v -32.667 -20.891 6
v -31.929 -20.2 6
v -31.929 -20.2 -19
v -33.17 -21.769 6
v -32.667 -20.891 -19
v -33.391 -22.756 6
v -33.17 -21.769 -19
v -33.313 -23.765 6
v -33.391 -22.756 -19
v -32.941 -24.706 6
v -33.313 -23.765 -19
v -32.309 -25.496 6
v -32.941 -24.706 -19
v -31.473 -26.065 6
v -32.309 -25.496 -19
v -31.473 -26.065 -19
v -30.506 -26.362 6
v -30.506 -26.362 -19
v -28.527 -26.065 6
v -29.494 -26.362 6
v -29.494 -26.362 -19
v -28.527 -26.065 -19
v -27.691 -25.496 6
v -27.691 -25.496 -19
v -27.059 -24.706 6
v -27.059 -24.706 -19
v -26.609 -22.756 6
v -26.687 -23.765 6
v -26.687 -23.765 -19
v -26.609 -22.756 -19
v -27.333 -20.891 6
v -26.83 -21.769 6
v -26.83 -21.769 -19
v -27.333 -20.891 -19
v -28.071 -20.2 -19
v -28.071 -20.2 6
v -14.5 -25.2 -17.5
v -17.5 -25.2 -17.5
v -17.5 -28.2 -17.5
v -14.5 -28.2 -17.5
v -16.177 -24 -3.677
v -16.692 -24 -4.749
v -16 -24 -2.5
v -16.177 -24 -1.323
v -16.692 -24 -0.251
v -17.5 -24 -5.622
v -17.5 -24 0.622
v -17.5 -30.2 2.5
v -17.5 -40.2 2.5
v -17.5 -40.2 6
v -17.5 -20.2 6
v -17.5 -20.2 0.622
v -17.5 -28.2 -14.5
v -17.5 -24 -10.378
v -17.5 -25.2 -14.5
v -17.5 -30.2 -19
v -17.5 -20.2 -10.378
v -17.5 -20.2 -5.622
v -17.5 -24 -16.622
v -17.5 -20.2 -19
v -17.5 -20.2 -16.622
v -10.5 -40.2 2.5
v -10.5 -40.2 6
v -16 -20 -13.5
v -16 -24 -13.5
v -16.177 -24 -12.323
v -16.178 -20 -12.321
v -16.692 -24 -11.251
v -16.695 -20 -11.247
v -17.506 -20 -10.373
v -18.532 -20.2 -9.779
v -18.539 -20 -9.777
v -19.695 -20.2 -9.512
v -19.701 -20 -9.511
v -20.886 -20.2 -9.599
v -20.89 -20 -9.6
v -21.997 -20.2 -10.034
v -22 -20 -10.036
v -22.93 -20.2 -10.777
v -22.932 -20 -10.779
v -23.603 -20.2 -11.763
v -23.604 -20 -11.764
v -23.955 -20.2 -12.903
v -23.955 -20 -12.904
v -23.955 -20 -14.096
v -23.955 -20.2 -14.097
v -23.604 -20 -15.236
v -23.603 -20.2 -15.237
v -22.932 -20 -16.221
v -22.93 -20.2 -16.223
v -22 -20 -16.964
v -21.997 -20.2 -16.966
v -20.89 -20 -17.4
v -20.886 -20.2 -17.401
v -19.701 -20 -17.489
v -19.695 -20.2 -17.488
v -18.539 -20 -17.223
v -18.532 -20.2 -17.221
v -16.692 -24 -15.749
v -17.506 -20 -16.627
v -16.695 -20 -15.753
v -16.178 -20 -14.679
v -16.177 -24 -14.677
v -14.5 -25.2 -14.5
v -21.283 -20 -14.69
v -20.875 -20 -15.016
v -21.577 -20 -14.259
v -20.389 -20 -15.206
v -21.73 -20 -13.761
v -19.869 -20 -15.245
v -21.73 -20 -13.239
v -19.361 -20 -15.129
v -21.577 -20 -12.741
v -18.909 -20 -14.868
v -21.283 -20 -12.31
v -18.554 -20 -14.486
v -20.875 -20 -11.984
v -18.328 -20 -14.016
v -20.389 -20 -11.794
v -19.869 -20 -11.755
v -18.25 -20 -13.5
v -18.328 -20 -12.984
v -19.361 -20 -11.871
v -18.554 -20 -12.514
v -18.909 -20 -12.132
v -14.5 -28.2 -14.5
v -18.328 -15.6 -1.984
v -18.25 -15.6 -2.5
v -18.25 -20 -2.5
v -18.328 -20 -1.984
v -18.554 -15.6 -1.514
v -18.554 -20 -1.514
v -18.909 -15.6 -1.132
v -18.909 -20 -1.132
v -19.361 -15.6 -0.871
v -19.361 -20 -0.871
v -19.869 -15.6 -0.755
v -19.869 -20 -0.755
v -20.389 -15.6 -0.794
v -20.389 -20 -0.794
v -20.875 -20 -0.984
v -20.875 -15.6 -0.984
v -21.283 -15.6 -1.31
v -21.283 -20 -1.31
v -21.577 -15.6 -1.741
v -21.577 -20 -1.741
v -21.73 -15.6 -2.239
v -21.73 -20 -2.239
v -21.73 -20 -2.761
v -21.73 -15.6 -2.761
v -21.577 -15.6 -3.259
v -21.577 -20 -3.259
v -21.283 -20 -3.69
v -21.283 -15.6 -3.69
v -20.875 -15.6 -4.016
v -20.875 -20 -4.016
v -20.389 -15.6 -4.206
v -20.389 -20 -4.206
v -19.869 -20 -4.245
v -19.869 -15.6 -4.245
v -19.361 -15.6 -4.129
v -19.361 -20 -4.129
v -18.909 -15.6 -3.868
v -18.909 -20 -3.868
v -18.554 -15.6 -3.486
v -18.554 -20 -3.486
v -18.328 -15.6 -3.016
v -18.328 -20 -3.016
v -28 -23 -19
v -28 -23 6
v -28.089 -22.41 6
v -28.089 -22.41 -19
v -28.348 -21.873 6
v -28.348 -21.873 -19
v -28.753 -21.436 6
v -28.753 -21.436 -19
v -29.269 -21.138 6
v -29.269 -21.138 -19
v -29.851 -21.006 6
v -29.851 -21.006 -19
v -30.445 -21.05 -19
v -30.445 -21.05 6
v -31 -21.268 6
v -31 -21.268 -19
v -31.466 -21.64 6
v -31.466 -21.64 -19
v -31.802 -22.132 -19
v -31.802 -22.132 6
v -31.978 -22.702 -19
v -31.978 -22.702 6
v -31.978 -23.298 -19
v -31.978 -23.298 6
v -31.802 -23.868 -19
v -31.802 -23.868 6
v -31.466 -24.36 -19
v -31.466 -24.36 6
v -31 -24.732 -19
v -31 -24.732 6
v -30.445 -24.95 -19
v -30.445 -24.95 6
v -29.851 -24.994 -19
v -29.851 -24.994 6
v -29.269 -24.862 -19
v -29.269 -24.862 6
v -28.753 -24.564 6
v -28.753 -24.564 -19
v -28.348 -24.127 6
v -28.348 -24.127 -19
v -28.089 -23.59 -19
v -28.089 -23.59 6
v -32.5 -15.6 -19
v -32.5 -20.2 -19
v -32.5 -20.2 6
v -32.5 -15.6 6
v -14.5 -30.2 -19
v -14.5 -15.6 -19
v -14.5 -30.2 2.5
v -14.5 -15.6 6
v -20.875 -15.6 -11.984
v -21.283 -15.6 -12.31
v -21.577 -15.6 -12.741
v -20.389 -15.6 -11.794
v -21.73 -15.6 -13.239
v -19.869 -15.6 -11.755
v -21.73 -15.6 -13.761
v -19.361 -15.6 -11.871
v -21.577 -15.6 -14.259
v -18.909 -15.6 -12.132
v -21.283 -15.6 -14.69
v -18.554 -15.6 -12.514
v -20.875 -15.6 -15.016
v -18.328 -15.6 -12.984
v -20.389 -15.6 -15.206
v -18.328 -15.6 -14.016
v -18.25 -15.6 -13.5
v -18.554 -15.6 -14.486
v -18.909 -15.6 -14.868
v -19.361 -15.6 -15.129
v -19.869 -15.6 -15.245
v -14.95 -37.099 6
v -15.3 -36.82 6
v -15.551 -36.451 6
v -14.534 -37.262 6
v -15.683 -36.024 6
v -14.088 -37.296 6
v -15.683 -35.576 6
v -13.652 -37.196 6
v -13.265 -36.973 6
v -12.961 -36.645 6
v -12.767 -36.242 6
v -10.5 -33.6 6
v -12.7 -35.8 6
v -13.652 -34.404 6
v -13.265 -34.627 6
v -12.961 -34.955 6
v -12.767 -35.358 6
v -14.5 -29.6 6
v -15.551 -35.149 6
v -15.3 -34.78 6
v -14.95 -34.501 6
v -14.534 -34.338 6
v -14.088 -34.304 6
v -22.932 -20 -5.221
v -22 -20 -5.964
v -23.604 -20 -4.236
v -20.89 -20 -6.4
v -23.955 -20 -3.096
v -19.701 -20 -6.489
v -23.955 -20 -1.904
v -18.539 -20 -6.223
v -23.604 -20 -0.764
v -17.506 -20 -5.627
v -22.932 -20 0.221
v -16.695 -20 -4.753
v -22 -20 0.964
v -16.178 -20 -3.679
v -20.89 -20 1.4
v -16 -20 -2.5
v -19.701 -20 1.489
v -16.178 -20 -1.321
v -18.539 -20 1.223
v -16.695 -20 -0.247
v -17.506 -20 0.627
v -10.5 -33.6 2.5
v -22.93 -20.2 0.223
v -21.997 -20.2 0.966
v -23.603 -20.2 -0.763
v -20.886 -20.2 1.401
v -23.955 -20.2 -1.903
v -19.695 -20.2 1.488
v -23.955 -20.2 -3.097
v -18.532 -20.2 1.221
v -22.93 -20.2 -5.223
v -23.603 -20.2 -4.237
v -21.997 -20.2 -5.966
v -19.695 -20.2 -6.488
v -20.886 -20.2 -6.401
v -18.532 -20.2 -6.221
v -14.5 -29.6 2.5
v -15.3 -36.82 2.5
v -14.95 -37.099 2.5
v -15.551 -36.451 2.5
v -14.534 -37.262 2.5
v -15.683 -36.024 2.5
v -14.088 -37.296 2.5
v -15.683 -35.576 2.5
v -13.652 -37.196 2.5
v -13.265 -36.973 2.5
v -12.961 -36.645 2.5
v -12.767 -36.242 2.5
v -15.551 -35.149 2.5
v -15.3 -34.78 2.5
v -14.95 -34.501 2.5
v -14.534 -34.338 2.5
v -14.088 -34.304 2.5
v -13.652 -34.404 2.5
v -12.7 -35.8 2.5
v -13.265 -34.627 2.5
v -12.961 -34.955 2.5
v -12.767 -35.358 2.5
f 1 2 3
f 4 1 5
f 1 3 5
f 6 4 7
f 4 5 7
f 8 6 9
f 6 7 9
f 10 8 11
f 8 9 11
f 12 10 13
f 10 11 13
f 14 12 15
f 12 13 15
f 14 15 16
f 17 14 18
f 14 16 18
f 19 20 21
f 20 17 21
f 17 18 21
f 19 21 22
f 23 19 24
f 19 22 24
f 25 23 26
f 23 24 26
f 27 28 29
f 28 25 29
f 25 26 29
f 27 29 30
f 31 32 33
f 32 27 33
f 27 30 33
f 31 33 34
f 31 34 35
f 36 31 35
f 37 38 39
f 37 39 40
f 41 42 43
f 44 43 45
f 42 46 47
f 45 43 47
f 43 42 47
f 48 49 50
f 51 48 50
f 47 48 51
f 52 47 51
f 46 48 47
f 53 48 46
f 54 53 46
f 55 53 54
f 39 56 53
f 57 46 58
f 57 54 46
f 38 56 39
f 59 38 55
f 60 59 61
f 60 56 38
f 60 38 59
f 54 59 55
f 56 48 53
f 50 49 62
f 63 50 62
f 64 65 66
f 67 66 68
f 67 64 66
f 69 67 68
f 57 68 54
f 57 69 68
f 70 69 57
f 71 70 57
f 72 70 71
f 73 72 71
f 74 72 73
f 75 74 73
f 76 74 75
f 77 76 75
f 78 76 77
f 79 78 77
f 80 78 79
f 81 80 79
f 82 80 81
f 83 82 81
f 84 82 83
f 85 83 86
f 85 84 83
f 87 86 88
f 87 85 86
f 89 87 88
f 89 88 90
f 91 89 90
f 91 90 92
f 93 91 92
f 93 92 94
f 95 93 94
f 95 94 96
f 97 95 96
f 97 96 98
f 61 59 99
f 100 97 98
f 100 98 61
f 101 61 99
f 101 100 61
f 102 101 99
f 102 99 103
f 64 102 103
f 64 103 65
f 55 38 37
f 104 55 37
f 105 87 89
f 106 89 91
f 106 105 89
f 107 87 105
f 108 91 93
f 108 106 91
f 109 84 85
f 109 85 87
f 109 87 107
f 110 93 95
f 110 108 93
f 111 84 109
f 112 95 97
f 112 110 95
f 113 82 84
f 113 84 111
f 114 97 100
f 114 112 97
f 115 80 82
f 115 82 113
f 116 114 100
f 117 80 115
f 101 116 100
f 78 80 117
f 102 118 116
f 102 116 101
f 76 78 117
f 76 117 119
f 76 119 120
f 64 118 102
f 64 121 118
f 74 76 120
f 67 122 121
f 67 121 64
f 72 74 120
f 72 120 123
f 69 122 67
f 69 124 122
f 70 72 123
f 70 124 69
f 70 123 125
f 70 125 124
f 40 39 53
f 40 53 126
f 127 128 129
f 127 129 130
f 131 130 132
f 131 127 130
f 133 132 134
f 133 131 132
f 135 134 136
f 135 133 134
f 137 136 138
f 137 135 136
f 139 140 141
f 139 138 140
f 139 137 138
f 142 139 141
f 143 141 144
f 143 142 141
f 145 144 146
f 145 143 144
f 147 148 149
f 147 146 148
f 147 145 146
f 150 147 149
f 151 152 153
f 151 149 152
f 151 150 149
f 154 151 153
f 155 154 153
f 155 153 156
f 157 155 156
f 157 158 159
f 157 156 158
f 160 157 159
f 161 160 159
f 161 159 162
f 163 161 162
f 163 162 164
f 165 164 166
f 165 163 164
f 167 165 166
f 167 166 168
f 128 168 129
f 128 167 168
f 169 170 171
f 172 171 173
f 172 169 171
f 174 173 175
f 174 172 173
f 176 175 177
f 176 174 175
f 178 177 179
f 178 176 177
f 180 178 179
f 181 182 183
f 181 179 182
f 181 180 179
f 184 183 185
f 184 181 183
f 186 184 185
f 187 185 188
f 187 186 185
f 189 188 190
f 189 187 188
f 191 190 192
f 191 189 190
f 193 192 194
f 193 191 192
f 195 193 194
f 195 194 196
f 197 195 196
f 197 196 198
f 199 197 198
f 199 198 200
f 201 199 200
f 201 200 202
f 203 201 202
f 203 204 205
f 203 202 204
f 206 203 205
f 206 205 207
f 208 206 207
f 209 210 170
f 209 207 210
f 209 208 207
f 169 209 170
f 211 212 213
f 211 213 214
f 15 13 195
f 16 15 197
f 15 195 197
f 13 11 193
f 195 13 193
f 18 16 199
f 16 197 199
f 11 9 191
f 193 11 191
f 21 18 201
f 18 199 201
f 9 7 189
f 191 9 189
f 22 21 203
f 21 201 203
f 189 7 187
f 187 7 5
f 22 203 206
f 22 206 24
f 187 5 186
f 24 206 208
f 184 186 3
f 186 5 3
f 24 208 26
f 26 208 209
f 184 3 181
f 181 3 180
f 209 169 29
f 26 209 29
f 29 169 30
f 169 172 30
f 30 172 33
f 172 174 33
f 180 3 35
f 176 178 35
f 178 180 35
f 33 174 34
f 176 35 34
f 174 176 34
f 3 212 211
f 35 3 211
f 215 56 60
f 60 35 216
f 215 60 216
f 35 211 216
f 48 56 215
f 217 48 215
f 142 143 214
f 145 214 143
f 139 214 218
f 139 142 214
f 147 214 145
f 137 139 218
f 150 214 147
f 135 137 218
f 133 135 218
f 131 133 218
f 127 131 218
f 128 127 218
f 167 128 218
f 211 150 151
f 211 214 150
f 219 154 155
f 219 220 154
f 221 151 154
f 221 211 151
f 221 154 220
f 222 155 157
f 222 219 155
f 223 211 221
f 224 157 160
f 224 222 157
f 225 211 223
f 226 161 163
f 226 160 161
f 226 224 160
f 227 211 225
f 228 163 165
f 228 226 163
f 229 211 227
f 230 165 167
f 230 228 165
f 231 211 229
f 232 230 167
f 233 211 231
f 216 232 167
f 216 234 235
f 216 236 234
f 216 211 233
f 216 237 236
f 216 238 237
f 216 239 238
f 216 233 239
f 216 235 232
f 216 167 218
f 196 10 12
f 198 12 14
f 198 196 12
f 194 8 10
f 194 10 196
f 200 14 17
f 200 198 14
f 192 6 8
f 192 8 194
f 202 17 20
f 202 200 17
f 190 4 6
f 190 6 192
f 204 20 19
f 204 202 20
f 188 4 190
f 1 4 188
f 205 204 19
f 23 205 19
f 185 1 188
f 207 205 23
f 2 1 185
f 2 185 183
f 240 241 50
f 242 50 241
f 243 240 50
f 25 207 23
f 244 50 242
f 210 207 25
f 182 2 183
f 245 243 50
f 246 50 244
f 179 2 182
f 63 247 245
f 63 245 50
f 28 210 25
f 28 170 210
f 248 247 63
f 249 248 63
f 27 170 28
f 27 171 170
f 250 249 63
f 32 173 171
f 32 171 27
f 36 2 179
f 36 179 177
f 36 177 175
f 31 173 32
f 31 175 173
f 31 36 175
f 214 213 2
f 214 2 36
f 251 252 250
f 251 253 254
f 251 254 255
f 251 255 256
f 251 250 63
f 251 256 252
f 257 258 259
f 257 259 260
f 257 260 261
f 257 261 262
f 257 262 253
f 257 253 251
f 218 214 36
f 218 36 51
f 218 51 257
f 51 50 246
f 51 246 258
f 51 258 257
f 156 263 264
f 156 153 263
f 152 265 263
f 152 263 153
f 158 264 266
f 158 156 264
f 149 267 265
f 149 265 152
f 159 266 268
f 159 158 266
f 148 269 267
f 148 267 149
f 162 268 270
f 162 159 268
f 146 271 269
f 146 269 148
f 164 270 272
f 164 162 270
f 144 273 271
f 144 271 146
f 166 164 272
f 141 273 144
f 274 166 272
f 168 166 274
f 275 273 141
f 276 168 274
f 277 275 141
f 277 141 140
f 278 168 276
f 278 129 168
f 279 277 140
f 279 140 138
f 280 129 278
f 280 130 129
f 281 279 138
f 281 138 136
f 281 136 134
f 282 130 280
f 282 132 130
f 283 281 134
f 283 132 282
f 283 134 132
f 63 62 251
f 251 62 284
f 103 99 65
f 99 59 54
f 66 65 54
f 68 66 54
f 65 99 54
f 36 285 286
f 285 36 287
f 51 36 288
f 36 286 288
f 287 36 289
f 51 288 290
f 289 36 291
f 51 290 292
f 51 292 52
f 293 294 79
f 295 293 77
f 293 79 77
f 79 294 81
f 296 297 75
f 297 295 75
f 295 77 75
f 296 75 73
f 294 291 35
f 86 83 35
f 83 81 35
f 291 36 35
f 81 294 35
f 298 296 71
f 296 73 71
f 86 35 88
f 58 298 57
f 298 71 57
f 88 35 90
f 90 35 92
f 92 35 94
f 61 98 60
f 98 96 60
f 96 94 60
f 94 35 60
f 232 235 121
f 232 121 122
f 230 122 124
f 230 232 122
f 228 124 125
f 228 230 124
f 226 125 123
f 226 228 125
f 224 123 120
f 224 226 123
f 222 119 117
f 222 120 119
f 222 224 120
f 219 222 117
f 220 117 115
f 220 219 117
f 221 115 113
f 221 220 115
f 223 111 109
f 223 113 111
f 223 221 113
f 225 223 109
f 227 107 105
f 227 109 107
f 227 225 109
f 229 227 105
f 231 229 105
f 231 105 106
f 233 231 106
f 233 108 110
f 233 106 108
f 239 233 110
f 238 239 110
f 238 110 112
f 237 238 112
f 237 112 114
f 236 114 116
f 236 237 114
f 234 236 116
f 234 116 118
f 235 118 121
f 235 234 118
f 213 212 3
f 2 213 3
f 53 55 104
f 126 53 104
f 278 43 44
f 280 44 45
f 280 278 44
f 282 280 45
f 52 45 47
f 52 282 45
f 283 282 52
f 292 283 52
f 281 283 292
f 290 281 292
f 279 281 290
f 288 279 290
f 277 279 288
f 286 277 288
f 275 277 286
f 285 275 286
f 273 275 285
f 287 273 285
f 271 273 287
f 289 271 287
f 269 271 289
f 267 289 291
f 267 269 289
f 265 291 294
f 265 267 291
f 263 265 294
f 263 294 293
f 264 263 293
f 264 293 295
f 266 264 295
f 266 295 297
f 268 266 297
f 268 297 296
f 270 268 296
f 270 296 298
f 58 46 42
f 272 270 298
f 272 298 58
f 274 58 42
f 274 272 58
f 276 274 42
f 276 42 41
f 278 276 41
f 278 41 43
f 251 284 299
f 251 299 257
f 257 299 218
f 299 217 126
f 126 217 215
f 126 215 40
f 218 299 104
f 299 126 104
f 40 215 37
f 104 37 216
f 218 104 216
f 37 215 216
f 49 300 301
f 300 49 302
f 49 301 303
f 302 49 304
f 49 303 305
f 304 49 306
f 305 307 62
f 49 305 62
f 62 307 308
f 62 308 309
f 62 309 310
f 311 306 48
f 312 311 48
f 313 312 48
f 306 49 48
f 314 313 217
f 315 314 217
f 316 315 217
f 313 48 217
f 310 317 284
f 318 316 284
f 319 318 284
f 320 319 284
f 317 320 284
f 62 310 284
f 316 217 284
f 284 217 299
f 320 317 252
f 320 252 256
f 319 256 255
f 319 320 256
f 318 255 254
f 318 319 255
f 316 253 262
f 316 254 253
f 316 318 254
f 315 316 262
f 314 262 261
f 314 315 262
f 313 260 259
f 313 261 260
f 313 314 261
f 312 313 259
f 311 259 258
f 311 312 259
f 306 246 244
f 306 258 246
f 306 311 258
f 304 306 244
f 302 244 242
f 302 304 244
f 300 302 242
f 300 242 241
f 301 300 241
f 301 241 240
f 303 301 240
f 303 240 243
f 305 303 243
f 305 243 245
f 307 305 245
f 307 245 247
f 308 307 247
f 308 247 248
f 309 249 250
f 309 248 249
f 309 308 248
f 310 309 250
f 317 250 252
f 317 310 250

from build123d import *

# Parameters (mm, degrees)
CYLINDER040_R          = 1.75
CYLINDER040_DEPTH      = 44
CYLINDER040_ROLL_ANGLE = 90
CYLINDER049_R          = 2
CYLINDER049_DEPTH      = 42
CYLINDER051_R          = 1.5
CYLINDER051_DEPTH      = 42
CYLINDER053_R          = 4
CYLINDER053_DEPTH      = 4
CYLINDER053_ROLL_ANGLE = 90
CYLINDER054_R          = 4
CYLINDER054_DEPTH      = 4
CYLINDER054_ROLL_ANGLE = 90
BOX089_W               = 42
BOX089_H               = 3
BOX089_DEPTH           = 3
CYLINDER043_R          = 1.75
CYLINDER043_DEPTH      = 44
CYLINDER043_ROLL_ANGLE = 90
CYLINDER048_R          = 3.4
CYLINDER048_DEPTH      = 25
BOX084_W               = 3
BOX084_H               = 14.6
BOX084_DEPTH           = 25
BOX085_W               = 7
BOX085_H               = 10.6
BOX085_DEPTH           = 3.5
CHAMFER_SIZE           = 4
BOX080_W               = 15
BOX080_H               = 4.6
BOX080_DEPTH           = 25


with BuildPart() as cylinder_for_hole_3_motherboard003:
    # Cylinder040 → Cylinder040 (new body)
    with BuildSketch(Plane.XY):
        Circle(CYLINDER040_R)
    extrude(amount=CYLINDER040_DEPTH)


with BuildPart() as cylinder_for_hole_3_motherboard003_1:
    # Cylinder040 roll: moved
    add(cylinder_for_hole_3_motherboard003.part.rotate(Axis((0, 0, 0), (1, 0, 0)), CYLINDER040_ROLL_ANGLE))


with BuildPart() as cylinder_for_hole_3_motherboard003_2:
    # Cylinder040 placement: moved
    add(cylinder_for_hole_3_motherboard003_1.part.moved(Location((-20, 6, -13.5))))


with BuildPart() as blower_screw:
    # Cylinder049 → Cylinder049 (new body)
    with BuildSketch(Plane(origin=(-30, -23, -19), x_dir=(1, 0, 0), z_dir=(0, 0, 1))):
        Circle(CYLINDER049_R)
    extrude(amount=CYLINDER049_DEPTH)


with BuildPart() as extruder_screw_l:
    # Cylinder051 → Cylinder051 (new body)
    with BuildSketch(Plane(origin=(-14.2, -35.8, -8), x_dir=(1, 0, 0), z_dir=(0, 0, 1))):
        Circle(CYLINDER051_R)
    extrude(amount=CYLINDER051_DEPTH)


with BuildPart() as cylinder053:
    # Cylinder053 → Cylinder053 (new body)
    with BuildSketch(Plane.XY):
        Circle(CYLINDER053_R)
    extrude(amount=CYLINDER053_DEPTH)


with BuildPart() as cylinder053_1:
    # Cylinder053 roll: moved
    add(cylinder053.part.rotate(Axis((0, 0, 0), (1, 0, 0)), CYLINDER053_ROLL_ANGLE))


with BuildPart() as cylinder053_2:
    # Cylinder053 placement: moved
    add(cylinder053_1.part.moved(Location((-20, -20, -2.5))))


with BuildPart() as cylinder054:
    # Cylinder054 → Cylinder054 (new body)
    with BuildSketch(Plane.XY):
        Circle(CYLINDER054_R)
    extrude(amount=CYLINDER054_DEPTH)


with BuildPart() as cylinder054_1:
    # Cylinder054 roll: moved
    add(cylinder054.part.rotate(Axis((0, 0, 0), (1, 0, 0)), CYLINDER054_ROLL_ANGLE))


with BuildPart() as cylinder054_2:
    # Cylinder054 placement: moved
    add(cylinder054_1.part.moved(Location((-20, -20, -13.5))))


with BuildPart() as fastener_hole001:
    # Box089 → Box089 (new body)
    with BuildSketch(Plane(origin=(-21.5, -28.2, -17.5), x_dir=(1, 0, 0), z_dir=(0, 0, 1))):
        with Locations((21, 1.5)):
            Rectangle(BOX089_W, BOX089_H)
    extrude(amount=BOX089_DEPTH)


with BuildPart() as blower_retention_holes:
    # Cylinder043 → Cylinder043 (new body)
    with BuildSketch(Plane.XY):
        Circle(CYLINDER043_R)
    extrude(amount=CYLINDER043_DEPTH)


with BuildPart() as blower_retention_holes_1:
    # Cylinder043 roll: moved
    add(blower_retention_holes.part.rotate(Axis((0, 0, 0), (1, 0, 0)), CYLINDER043_ROLL_ANGLE))


with BuildPart() as blower_retention_holes_2:
    # Cylinder043 placement: moved
    add(blower_retention_holes_1.part.moved(Location((-20, 6, -2.5))))

    # Fusion023: union cylinder for hole 3 - Motherboard003, blower screw, extruder screw  L, Cylinder053, Cylinder054, fastener hole001
    add(cylinder_for_hole_3_motherboard003_2.part)
    add(blower_screw.part)
    add(extruder_screw_l.part)
    add(cylinder053_2.part)
    add(cylinder054_2.part)
    add(fastener_hole001.part)


with BuildPart() as blower_retention:
    # Cylinder048 → Cylinder048 (new body)
    with BuildSketch(Plane(origin=(-30, -23, -19), x_dir=(1, 0, 0), z_dir=(0, 0, 1))):
        Circle(CYLINDER048_R)
    extrude(amount=CYLINDER048_DEPTH)


with BuildPart() as motor_bracket_base_l_lower:
    # Box084 → Box084 (new body)
    with BuildSketch(Plane(origin=(-17.5, -30.2, -19), x_dir=(1, 0, 0), z_dir=(0, 0, 1))):
        with Locations((1.5, 7.3)):
            Rectangle(BOX084_W, BOX084_H)
    extrude(amount=BOX084_DEPTH)


with BuildPart() as motor_bracket_base_l_upper_chamfered:
    # Box085 → Box085 (new body)
    with BuildSketch(Plane(origin=(-17.5, -40.2, 2.5), x_dir=(1, 0, 0), z_dir=(0, 0, 1))):
        with Locations((3.5, 5.3)):
            Rectangle(BOX085_W, BOX085_H)
    extrude(amount=BOX085_DEPTH)

    # Chamfer
    chamfer_edges = [motor_bracket_base_l_upper_chamfered.edges().sort_by_distance(p)[0] for p in [
        (-10.5, -29.6, 4.25),
    ]]
    chamfer(chamfer_edges, length=CHAMFER_SIZE)


with BuildPart() as blower_retention_arm_with_holes:
    # Box080 → Box080 (new body)
    with BuildSketch(Plane(origin=(-32.5, -20.2, -19), x_dir=(1, 0, 0), z_dir=(0, 0, 1))):
        with Locations((7.5, 2.3)):
            Rectangle(BOX080_W, BOX080_H)
    extrude(amount=BOX080_DEPTH)

    # Fusion022: union blower retention, motor bracket base L lower, motor bracket base L upper chamfered
    add(blower_retention.part)
    add(motor_bracket_base_l_lower.part)
    add(motor_bracket_base_l_upper_chamfered.part)

    # Cut013: cut blower retention holes
    add(blower_retention_holes_2.part, mode=Mode.SUBTRACT)


solid = blower_retention_arm_with_holes.part
